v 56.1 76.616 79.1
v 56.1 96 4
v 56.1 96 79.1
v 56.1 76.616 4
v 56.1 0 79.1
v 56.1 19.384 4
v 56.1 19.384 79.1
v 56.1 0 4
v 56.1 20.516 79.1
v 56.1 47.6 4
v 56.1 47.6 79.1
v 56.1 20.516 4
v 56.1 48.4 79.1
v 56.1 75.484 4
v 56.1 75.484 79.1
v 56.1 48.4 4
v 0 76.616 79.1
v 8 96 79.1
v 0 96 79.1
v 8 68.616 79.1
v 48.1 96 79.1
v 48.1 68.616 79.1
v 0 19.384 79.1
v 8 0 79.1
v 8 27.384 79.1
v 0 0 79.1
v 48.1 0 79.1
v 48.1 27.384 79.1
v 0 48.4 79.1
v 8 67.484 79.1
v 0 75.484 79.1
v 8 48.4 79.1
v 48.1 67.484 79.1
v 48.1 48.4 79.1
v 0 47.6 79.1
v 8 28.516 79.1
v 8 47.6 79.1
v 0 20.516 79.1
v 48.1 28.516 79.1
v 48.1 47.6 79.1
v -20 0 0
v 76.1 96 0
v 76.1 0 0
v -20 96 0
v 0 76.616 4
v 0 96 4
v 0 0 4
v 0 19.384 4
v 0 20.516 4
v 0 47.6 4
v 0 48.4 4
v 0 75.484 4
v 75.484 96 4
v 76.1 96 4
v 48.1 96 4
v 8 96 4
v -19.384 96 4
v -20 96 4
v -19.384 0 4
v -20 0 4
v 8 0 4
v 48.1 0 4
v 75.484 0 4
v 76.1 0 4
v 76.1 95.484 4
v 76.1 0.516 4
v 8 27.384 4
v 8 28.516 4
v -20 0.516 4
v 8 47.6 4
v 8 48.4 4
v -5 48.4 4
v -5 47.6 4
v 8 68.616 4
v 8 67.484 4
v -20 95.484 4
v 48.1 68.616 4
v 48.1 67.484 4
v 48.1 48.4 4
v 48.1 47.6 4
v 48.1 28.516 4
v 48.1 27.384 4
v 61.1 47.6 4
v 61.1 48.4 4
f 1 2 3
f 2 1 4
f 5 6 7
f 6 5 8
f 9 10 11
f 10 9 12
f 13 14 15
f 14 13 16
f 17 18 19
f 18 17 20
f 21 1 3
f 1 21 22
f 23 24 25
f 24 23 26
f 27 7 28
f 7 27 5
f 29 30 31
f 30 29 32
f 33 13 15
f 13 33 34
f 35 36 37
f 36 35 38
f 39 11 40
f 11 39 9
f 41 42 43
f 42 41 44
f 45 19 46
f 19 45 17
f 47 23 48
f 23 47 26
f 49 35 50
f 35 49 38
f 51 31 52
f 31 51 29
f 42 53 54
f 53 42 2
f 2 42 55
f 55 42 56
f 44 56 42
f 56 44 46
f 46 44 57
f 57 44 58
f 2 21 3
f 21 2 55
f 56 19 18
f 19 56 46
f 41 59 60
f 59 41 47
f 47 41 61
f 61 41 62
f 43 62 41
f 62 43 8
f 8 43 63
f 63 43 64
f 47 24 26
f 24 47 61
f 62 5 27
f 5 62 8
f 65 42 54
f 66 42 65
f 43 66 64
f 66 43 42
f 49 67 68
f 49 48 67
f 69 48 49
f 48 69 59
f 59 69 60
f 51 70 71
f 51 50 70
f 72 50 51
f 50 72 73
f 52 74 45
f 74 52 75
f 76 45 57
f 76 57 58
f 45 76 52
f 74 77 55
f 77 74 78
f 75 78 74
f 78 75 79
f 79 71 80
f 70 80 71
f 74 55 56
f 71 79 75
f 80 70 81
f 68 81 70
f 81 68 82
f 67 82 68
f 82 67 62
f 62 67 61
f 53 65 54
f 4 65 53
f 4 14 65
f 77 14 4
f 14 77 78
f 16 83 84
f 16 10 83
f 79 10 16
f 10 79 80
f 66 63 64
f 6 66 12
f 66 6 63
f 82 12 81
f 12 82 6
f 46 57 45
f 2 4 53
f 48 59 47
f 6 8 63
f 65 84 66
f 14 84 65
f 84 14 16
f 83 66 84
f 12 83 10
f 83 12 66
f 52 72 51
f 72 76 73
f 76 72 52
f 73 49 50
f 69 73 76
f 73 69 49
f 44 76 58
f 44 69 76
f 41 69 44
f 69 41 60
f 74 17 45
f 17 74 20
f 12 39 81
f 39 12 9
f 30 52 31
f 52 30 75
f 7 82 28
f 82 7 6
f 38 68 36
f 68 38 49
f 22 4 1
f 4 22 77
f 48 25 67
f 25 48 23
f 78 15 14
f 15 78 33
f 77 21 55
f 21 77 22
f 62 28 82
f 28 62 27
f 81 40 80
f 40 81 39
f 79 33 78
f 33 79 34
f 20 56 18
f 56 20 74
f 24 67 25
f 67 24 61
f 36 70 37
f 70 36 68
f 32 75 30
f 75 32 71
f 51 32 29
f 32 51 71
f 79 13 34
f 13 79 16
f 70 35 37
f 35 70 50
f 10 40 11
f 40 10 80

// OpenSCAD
length = 80;
depth = 40.1;
saw_blade_height = 35;

height = depth + saw_blade_height;
wall = 8;
bottom = wall / 2;
overcut = 5;
blade_cut_width = 0.8;

clamp_extension = 20;

difference() {
  union() {
    cube([depth + wall * 2, length + wall * 2, height + bottom]);
    translate([-clamp_extension, 0, 0]) cube([depth + wall * 2 + clamp_extension * 2, length + wall * 2, bottom]);
  }
  translate([wall, -overcut, bottom]) cube([depth, length + wall * 2 + overcut * 2, height + overcut]);

  translate([-overcut, (length - blade_cut_width) / 2 + wall, bottom]) cube([depth + wall * 2 + overcut * 2, blade_cut_width, height + overcut]);

  for (angle = [-45, 45]) {
    cut_length = 2 * (depth + length + wall * 4 + overcut);
    translate([(depth + wall * 2) / 2, (length + wall * 2) / 2, bottom])
      rotate([0, 0, angle])
        translate([-cut_length / 2, -blade_cut_width / 2, 0])
          cube([cut_length, blade_cut_width, height + overcut]);
  }
}
